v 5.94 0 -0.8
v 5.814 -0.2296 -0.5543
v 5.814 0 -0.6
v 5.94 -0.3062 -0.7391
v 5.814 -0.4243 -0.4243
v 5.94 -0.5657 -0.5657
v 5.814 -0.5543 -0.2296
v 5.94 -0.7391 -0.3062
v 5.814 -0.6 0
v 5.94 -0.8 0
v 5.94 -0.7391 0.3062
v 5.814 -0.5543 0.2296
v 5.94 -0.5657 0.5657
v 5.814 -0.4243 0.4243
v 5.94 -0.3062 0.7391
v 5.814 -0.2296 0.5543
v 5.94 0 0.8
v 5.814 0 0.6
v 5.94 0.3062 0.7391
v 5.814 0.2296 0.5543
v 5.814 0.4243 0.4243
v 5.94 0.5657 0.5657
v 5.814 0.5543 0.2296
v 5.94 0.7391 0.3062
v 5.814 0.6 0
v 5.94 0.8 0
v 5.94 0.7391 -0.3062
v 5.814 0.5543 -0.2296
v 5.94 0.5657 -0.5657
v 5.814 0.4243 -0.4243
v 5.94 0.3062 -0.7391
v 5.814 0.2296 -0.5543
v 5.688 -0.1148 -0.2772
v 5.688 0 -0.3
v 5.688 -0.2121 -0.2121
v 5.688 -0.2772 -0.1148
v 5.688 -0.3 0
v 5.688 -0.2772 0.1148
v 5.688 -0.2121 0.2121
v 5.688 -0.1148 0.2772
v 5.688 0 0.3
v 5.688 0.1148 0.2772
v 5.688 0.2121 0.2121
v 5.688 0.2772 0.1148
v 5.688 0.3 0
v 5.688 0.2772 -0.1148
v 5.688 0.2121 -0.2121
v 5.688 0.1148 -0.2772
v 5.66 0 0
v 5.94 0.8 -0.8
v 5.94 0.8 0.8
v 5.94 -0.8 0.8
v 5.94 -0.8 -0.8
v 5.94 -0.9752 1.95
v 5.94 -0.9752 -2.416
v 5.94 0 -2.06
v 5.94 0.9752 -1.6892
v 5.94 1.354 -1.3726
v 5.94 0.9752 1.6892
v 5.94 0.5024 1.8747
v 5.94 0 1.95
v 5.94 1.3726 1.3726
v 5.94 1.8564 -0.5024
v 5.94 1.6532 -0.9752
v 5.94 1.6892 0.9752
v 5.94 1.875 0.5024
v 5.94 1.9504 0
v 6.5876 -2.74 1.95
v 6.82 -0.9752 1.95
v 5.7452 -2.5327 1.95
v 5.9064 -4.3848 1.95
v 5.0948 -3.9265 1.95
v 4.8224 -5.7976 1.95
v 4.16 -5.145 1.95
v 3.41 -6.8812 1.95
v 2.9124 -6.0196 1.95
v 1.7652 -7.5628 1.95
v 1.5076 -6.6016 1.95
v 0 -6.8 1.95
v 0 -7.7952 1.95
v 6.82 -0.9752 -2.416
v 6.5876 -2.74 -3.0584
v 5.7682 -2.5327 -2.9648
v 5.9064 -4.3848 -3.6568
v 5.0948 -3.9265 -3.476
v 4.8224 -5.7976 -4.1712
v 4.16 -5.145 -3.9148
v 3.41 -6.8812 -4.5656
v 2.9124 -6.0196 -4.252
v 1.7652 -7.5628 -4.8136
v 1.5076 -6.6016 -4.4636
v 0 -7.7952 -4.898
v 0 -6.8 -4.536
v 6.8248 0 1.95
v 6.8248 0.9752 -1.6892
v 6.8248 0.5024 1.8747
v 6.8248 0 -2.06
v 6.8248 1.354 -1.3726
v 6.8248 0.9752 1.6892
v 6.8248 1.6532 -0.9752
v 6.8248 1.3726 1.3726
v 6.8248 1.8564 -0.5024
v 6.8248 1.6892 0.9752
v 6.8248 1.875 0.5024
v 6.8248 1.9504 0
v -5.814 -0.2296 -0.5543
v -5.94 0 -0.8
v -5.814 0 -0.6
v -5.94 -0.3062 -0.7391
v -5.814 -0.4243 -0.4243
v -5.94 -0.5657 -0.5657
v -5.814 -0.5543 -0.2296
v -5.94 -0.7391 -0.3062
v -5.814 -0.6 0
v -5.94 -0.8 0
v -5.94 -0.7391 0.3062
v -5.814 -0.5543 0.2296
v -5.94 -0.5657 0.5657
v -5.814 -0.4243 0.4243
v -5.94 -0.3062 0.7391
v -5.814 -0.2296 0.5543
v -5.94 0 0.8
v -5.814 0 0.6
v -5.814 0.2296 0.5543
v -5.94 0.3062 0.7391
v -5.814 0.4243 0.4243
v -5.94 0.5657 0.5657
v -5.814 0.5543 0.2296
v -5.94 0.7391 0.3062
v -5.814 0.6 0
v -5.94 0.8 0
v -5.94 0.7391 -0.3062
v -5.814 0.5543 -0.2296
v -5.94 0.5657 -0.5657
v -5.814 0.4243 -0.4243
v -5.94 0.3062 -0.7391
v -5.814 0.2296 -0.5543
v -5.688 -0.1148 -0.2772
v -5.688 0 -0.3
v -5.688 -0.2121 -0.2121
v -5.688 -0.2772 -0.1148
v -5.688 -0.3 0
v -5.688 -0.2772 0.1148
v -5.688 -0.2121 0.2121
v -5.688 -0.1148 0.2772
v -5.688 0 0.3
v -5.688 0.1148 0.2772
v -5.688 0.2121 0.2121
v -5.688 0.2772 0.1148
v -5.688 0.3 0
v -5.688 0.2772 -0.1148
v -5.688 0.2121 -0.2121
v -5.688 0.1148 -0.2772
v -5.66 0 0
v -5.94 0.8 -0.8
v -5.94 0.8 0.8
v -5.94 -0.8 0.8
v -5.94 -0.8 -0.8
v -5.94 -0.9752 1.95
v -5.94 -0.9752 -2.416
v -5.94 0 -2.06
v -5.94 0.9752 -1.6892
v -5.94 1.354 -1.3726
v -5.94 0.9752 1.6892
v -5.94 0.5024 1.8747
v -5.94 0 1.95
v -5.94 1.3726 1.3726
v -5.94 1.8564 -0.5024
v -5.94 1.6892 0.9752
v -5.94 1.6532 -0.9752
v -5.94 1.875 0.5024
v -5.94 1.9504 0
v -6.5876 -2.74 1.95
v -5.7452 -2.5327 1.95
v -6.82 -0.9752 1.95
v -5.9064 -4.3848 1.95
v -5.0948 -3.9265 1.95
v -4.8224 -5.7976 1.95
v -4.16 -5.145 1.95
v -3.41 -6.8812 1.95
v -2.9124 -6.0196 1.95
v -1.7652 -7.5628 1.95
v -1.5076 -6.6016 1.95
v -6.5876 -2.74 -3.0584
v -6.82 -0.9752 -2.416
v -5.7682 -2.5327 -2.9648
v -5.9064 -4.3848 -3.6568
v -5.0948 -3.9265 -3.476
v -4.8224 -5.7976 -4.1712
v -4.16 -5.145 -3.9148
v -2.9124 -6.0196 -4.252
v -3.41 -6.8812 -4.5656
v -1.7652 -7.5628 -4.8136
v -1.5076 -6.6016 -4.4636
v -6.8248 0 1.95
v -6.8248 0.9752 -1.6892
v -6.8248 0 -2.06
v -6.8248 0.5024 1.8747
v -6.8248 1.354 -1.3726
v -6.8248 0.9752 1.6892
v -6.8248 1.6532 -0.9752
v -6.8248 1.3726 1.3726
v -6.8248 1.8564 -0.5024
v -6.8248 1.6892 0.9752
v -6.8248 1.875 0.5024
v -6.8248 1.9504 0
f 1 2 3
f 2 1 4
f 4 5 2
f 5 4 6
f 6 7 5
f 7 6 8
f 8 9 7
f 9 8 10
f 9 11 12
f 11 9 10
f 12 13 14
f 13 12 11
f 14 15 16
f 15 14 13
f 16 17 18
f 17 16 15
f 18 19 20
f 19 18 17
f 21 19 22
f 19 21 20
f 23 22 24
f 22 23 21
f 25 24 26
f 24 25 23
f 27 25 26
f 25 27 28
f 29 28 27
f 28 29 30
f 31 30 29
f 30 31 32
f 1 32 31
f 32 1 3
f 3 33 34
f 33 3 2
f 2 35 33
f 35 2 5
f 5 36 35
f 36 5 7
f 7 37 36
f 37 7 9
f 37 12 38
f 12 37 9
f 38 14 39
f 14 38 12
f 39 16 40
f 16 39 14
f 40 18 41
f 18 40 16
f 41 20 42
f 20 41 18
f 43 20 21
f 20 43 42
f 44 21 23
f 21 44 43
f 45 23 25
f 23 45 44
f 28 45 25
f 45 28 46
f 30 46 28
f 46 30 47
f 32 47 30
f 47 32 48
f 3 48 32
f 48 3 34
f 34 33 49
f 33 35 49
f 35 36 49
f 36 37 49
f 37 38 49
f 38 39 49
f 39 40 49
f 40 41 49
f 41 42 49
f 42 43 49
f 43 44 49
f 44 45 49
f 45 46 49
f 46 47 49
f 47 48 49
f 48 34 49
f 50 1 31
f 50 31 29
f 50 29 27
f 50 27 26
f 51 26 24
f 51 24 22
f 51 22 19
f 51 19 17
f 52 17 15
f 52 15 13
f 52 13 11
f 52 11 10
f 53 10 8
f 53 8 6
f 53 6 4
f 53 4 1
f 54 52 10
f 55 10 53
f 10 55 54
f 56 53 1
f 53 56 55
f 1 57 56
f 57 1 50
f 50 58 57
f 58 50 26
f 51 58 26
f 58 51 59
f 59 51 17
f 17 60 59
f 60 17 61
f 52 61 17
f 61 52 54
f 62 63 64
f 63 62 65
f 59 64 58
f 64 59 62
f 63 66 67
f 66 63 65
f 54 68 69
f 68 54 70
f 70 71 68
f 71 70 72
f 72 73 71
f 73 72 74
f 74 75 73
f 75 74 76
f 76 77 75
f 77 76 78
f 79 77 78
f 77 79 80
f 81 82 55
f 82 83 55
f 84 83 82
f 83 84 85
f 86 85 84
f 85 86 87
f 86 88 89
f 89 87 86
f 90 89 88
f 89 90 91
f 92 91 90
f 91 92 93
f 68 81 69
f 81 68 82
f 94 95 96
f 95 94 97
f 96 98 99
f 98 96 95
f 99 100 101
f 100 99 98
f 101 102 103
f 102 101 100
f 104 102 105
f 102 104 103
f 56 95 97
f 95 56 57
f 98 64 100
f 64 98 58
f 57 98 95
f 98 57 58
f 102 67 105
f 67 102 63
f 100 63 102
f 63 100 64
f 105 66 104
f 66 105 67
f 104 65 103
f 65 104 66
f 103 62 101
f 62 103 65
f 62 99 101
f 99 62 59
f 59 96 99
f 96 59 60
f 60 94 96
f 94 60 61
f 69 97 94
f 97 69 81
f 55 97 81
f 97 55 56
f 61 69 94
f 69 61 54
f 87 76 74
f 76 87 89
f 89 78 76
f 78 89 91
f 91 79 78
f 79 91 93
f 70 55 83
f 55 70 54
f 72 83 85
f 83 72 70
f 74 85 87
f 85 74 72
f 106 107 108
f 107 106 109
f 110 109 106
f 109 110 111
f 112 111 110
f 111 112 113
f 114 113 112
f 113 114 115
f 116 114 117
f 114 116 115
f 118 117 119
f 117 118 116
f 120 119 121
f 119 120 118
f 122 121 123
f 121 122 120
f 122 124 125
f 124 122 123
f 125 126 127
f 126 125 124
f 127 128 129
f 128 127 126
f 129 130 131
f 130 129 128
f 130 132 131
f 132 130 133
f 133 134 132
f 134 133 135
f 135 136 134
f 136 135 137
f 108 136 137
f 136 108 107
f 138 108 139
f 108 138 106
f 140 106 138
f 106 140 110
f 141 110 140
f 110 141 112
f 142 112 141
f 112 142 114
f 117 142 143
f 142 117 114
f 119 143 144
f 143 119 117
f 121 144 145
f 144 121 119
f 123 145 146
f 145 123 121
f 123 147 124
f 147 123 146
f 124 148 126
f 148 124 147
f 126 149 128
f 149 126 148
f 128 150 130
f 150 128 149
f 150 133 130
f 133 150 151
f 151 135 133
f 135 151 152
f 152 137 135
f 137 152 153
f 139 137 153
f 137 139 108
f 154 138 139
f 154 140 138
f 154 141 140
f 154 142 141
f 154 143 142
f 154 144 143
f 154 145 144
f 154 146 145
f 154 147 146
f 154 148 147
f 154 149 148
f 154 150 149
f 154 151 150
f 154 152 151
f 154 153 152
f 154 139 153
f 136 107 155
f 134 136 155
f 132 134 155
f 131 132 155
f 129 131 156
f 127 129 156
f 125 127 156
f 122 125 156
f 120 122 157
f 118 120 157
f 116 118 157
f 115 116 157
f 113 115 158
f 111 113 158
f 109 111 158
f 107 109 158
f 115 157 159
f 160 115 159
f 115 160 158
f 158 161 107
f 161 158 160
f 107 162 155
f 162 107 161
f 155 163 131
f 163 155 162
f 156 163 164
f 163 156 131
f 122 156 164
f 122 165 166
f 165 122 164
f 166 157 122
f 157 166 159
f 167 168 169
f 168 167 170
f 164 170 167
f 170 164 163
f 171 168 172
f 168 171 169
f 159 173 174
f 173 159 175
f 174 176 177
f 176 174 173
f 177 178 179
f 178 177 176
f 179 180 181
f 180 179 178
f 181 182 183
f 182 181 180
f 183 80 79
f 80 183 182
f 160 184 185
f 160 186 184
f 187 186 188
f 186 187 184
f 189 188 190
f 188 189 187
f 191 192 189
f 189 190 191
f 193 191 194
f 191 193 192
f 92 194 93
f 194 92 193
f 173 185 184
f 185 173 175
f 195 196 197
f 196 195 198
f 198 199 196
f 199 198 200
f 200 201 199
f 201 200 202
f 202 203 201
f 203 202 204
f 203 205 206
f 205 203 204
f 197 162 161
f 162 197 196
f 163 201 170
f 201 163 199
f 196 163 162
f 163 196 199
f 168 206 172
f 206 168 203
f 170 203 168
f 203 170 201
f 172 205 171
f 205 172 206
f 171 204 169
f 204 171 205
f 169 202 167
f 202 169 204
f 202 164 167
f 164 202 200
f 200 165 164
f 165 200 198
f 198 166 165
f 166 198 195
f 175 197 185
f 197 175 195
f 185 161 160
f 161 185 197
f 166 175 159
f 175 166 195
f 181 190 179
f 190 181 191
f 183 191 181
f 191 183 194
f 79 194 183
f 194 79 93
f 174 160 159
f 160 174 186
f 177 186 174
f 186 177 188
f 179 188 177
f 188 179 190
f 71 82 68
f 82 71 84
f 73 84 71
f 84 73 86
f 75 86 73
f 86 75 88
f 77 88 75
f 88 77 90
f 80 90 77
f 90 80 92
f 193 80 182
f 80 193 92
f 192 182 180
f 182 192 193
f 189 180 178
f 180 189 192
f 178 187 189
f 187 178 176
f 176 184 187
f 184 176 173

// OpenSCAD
// file: ../p/4-4edge.scad
use <../lib.scad>
function ldraw_lib__4_4edge() = [
// 0 Circle 1.0
// 0 Name: 4-4edge.dat
// 0 Author: James Jessiman
// 0 !LDRAW_ORG Primitive UPDATE 2017-01
// 0 !LICENSE Licensed under CC BY 2.0 and CC BY 4.0 : see CAreadme.txt
// 
// 0 BFC CERTIFY CCW
  [0,"BFC","CERTIFY"],
  [0,"BFC","CCW"],
// 
// 0 !HISTORY 1998-12-15 [PTadmin] Official Update 1998-10
// 0 !HISTORY 2005-12-28 [PTadmin] Official Update 2005-01
// 0 !HISTORY 2007-06-24 [PTadmin] Header formatted for Contributor Agreement
// 0 !HISTORY 2008-07-01 [PTadmin] Official Update 2008-01
// 0 !HISTORY 2017-01-15 [Steffen] BFCed
// 0 !HISTORY 2017-12-30 [PTadmin] Official Update 2017-01
// 
// 
// 2 24 1 0 0 0.9239 0 0.3827
  [2,24,1,0,0,0.9239,0,0.3827],
// 2 24 0.9239 0 0.3827 0.7071 0 0.7071
  [2,24,0.9239,0,0.3827,0.7071,0,0.7071],
// 2 24 0.7071 0 0.7071 0.3827 0 0.9239
  [2,24,0.7071,0,0.7071,0.3827,0,0.9239],
// 2 24 0.3827 0 0.9239 0 0 1
  [2,24,0.3827,0,0.9239,0,0,1],
// 2 24 0 0 1 -0.3827 0 0.9239
  [2,24,0,0,1,-0.3827,0,0.9239],
// 2 24 -0.3827 0 0.9239 -0.7071 0 0.7071
  [2,24,-0.3827,0,0.9239,-0.7071,0,0.7071],
// 2 24 -0.7071 0 0.7071 -0.9239 0 0.3827
  [2,24,-0.7071,0,0.7071,-0.9239,0,0.3827],
// 2 24 -0.9239 0 0.3827 -1 0 -0
  [2,24,-0.9239,0,0.3827,-1,0,-0],
// 2 24 -1 0 -0 -0.9239 0 -0.3827
  [2,24,-1,0,-0,-0.9239,0,-0.3827],
// 2 24 -0.9239 0 -0.3827 -0.7071 0 -0.7071
  [2,24,-0.9239,0,-0.3827,-0.7071,0,-0.7071],
// 2 24 -0.7071 0 -0.7071 -0.3827 0 -0.9239
  [2,24,-0.7071,0,-0.7071,-0.3827,0,-0.9239],
// 2 24 -0.3827 0 -0.9239 0 0 -1
  [2,24,-0.3827,0,-0.9239,0,0,-1],
// 2 24 0 0 -1 0.3827 0 -0.9239
  [2,24,0,0,-1,0.3827,0,-0.9239],
// 2 24 0.3827 0 -0.9239 0.7071 0 -0.7071
  [2,24,0.3827,0,-0.9239,0.7071,0,-0.7071],
// 2 24 0.7071 0 -0.7071 0.9239 0 -0.3827
  [2,24,0.7071,0,-0.7071,0.9239,0,-0.3827],
// 2 24 0.9239 0 -0.3827 1 0 0
  [2,24,0.9239,0,-0.3827,1,0,0],
];
module ldraw_lib__4_4edge(step=0, col=false, unit=2/5, alt=false, line=0.2, solid=!$preview)
    makepoly(ldraw_lib__4_4edge(), step=step, col=col, unit=unit, alt=alt, line=line, solid=solid);
ldraw_lib__4_4edge(line=0.2);
// file: ../p/4-4con3.scad
use <../lib.scad>
function ldraw_lib__4_4con3() = [
// 0 Cone  3 x 1.0
// 0 Name: 4-4con3.dat
// 0 Author: Niels Karsdorp [nielsk]
// 0 !LDRAW_ORG Primitive UPDATE 2003-02
// 0 !LICENSE Licensed under CC BY 4.0 : see CAreadme.txt
// 
// 0 BFC CERTIFY CCW
  [0,"BFC","CERTIFY"],
  [0,"BFC","CCW"],
// 
// 0 !HISTORY 2003-08-01 [PTadmin] Official Update 2003-02
// 0 !HISTORY 2007-06-24 [PTadmin] Header formatted for Contributor Agreement
// 0 !HISTORY 2008-07-01 [PTadmin] Official Update 2008-01
// 
// 
// 5 24 3 1 0 4 0 0 2.7717 1 1.1481 2.7717 1 -1.1481
  [5,24,3,1,0,4,0,0,2.7717,1,1.1481,2.7717,1,-1.1481],
// 5 24 2.7717 1 1.1481 3.6956 0 1.5308 2.1213 1 2.1213 3 1 0
  [5,24,2.7717,1,1.1481,3.6956,0,1.5308,2.1213,1,2.1213,3,1,0],
// 5 24 2.1213 1 2.1213 2.8284 0 2.8284 1.1481 1 2.7717 2.7717 1 1.1481
  [5,24,2.1213,1,2.1213,2.8284,0,2.8284,1.1481,1,2.7717,2.7717,1,1.1481],
// 5 24 1.1481 1 2.7717 1.5308 0 3.6956 0 1 3 2.1213 1 2.1213
  [5,24,1.1481,1,2.7717,1.5308,0,3.6956,0,1,3,2.1213,1,2.1213],
// 5 24 0 1 3 0 0 4 -1.1481 1 2.7717 1.1481 1 2.7717
  [5,24,0,1,3,0,0,4,-1.1481,1,2.7717,1.1481,1,2.7717],
// 5 24 -1.1481 1 2.7717 -1.5308 0 3.6956 -2.1213 1 2.1213 0 1 3
  [5,24,-1.1481,1,2.7717,-1.5308,0,3.6956,-2.1213,1,2.1213,0,1,3],
// 5 24 -2.1213 1 2.1213 -2.8284 0 2.8284 -2.7717 1 1.1481 -1.1481 1 2.7717
  [5,24,-2.1213,1,2.1213,-2.8284,0,2.8284,-2.7717,1,1.1481,-1.1481,1,2.7717],
// 5 24 -2.7717 1 1.1481 -3.6956 0 1.5308 -3 1 0 -2.1213 1 2.1213
  [5,24,-2.7717,1,1.1481,-3.6956,0,1.5308,-3,1,0,-2.1213,1,2.1213],
// 5 24 -3 1 0 -4 0 0 -2.7717 1 -1.1481 -2.7717 1 1.1481
  [5,24,-3,1,0,-4,0,0,-2.7717,1,-1.1481,-2.7717,1,1.1481],
// 5 24 -2.7717 1 -1.1481 -3.6956 0 -1.5308 -2.1213 1 -2.1213 -3 1 0
  [5,24,-2.7717,1,-1.1481,-3.6956,0,-1.5308,-2.1213,1,-2.1213,-3,1,0],
// 5 24 -2.1213 1 -2.1213 -2.8284 0 -2.8284 -1.1481 1 -2.7717 -2.7717 1 -1.1481
  [5,24,-2.1213,1,-2.1213,-2.8284,0,-2.8284,-1.1481,1,-2.7717,-2.7717,1,-1.1481],
// 5 24 -1.1481 1 -2.7717 -1.5308 0 -3.6956 0 1 -3 -2.1213 1 -2.1213
  [5,24,-1.1481,1,-2.7717,-1.5308,0,-3.6956,0,1,-3,-2.1213,1,-2.1213],
// 5 24 0 1 -3 0 0 -4 1.1481 1 -2.7717 -1.1481 1 -2.7717
  [5,24,0,1,-3,0,0,-4,1.1481,1,-2.7717,-1.1481,1,-2.7717],
// 5 24 1.1481 1 -2.7717 1.5308 0 -3.6956 2.1213 1 -2.1213 0 1 -3
  [5,24,1.1481,1,-2.7717,1.5308,0,-3.6956,2.1213,1,-2.1213,0,1,-3],
// 5 24 2.1213 1 -2.1213 2.8284 0 -2.8284 2.7717 1 -1.1481 1.1481 1 -2.7717
  [5,24,2.1213,1,-2.1213,2.8284,0,-2.8284,2.7717,1,-1.1481,1.1481,1,-2.7717],
// 5 24 2.7717 1 -1.1481 3.6956 0 -1.5308 3 1 0 2.1213 1 -2.1213
  [5,24,2.7717,1,-1.1481,3.6956,0,-1.5308,3,1,0,2.1213,1,-2.1213],
// 
// 4 16 3 1 0 2.7717 1 1.1481 3.6956 0 1.5308 4 0 0
  [4,16,3,1,0,2.7717,1,1.1481,3.6956,0,1.5308,4,0,0],
// 4 16 2.7717 1 1.1481 2.1213 1 2.1213 2.8284 0 2.8284 3.6956 0 1.5308
  [4,16,2.7717,1,1.1481,2.1213,1,2.1213,2.8284,0,2.8284,3.6956,0,1.5308],
// 4 16 2.1213 1 2.1213 1.1481 1 2.7717 1.5308 0 3.6956 2.8284 0 2.8284
  [4,16,2.1213,1,2.1213,1.1481,1,2.7717,1.5308,0,3.6956,2.8284,0,2.8284],
// 4 16 1.1481 1 2.7717 0 1 3 0 0 4 1.5308 0 3.6956
  [4,16,1.1481,1,2.7717,0,1,3,0,0,4,1.5308,0,3.6956],
// 4 16 0 1 3 -1.1481 1 2.7717 -1.5308 0 3.6956 0 0 4
  [4,16,0,1,3,-1.1481,1,2.7717,-1.5308,0,3.6956,0,0,4],
// 4 16 -1.1481 1 2.7717 -2.1213 1 2.1213 -2.8284 0 2.8284 -1.5308 0 3.6956
  [4,16,-1.1481,1,2.7717,-2.1213,1,2.1213,-2.8284,0,2.8284,-1.5308,0,3.6956],
// 4 16 -2.1213 1 2.1213 -2.7717 1 1.1481 -3.6956 0 1.5308 -2.8284 0 2.8284
  [4,16,-2.1213,1,2.1213,-2.7717,1,1.1481,-3.6956,0,1.5308,-2.8284,0,2.8284],
// 4 16 -2.7717 1 1.1481 -3 1 0 -4 0 0 -3.6956 0 1.5308
  [4,16,-2.7717,1,1.1481,-3,1,0,-4,0,0,-3.6956,0,1.5308],
// 4 16 -3 1 0 -2.7717 1 -1.1481 -3.6956 0 -1.5308 -4 0 0
  [4,16,-3,1,0,-2.7717,1,-1.1481,-3.6956,0,-1.5308,-4,0,0],
// 4 16 -2.7717 1 -1.1481 -2.1213 1 -2.1213 -2.8284 0 -2.8284 -3.6956 0 -1.5308
  [4,16,-2.7717,1,-1.1481,-2.1213,1,-2.1213,-2.8284,0,-2.8284,-3.6956,0,-1.5308],
// 4 16 -2.1213 1 -2.1213 -1.1481 1 -2.7717 -1.5308 0 -3.6956 -2.8284 0 -2.8284
  [4,16,-2.1213,1,-2.1213,-1.1481,1,-2.7717,-1.5308,0,-3.6956,-2.8284,0,-2.8284],
// 4 16 -1.1481 1 -2.7717 0 1 -3 0 0 -4 -1.5308 0 -3.6956
  [4,16,-1.1481,1,-2.7717,0,1,-3,0,0,-4,-1.5308,0,-3.6956],
// 4 16 0 1 -3 1.1481 1 -2.7717 1.5308 0 -3.6956 0 0 -4
  [4,16,0,1,-3,1.1481,1,-2.7717,1.5308,0,-3.6956,0,0,-4],
// 4 16 1.1481 1 -2.7717 2.1213 1 -2.1213 2.8284 0 -2.8284 1.5308 0 -3.6956
  [4,16,1.1481,1,-2.7717,2.1213,1,-2.1213,2.8284,0,-2.8284,1.5308,0,-3.6956],
// 4 16 2.1213 1 -2.1213 2.7717 1 -1.1481 3.6956 0 -1.5308 2.8284 0 -2.8284
  [4,16,2.1213,1,-2.1213,2.7717,1,-1.1481,3.6956,0,-1.5308,2.8284,0,-2.8284],
// 4 16 2.7717 1 -1.1481 3 1 0 4 0 0 3.6956 0 -1.5308
  [4,16,2.7717,1,-1.1481,3,1,0,4,0,0,3.6956,0,-1.5308],
// 
// 0
// 
];
module ldraw_lib__4_4con3(step=0, col=false, unit=2/5, alt=false, line=0.2, solid=!$preview)
    makepoly(ldraw_lib__4_4con3(), step=step, col=col, unit=unit, alt=alt, line=line, solid=solid);
ldraw_lib__4_4con3(line=0.2);
// file: ../p/4-4con1.scad
use <../lib.scad>
function ldraw_lib__4_4con1() = [
// 0 Cone  1 x 1.0
// 0 Name: 4-4con1.dat
// 0 Author: Steve Bliss [sbliss]
// 0 !LDRAW_ORG Primitive UPDATE 2012-01
// 0 !LICENSE Licensed under CC BY 4.0 : see CAreadme.txt
// 
// 0 BFC CERTIFY CCW
  [0,"BFC","CERTIFY"],
  [0,"BFC","CCW"],
// 
// 0 !HISTORY 1999-08-19 [sbliss] Renamed 4-4con12.dat to 4-4con1.dat, Moved all conditional lines before quads
// 0 !HISTORY 2000-05-07 [PTadmin] Official Update 2000-01
// 0 !HISTORY 2002-12-11 [cwdee] Standardised title and made BFC compliant
// 0 !HISTORY 2003-08-01 [PTadmin] Official Update 2003-02
// 0 !HISTORY 2007-06-24 [PTadmin] Header formatted for Contributor Agreement
// 0 !HISTORY 2008-07-01 [PTadmin] Official Update 2008-01
// 0 !HISTORY 2012-02-16 [Philo] Changed to CCW, reordered
// 0 !HISTORY 2012-03-30 [PTadmin] Official Update 2012-01
// 
// 
// 5 24 1 1 0 2 0 0 0.9239 1 -0.3827 0.9239 1 0.3827
  [5,24,1,1,0,2,0,0,0.9239,1,-0.3827,0.9239,1,0.3827],
// 5 24 0.9239 1 0.3827 1.8478 0 0.7654 1 1 0 0.7071 1 0.7071
  [5,24,0.9239,1,0.3827,1.8478,0,0.7654,1,1,0,0.7071,1,0.7071],
// 5 24 0.7071 1 0.7071 1.4142 0 1.4142 0.9239 1 0.3827 0.3827 1 0.9239
  [5,24,0.7071,1,0.7071,1.4142,0,1.4142,0.9239,1,0.3827,0.3827,1,0.9239],
// 5 24 0.3827 1 0.9239 0.7654 0 1.8478 0.7071 1 0.7071 0 1 1
  [5,24,0.3827,1,0.9239,0.7654,0,1.8478,0.7071,1,0.7071,0,1,1],
// 5 24 0 1 1 0 0 2 0.3827 1 0.9239 -0.3827 1 0.9239
  [5,24,0,1,1,0,0,2,0.3827,1,0.9239,-0.3827,1,0.9239],
// 5 24 -0.3827 1 0.9239 -0.7654 0 1.8478 0 1 1 -0.7071 1 0.7071
  [5,24,-0.3827,1,0.9239,-0.7654,0,1.8478,0,1,1,-0.7071,1,0.7071],
// 5 24 -0.7071 1 0.7071 -1.4142 0 1.4142 -0.3827 1 0.9239 -0.9239 1 0.3827
  [5,24,-0.7071,1,0.7071,-1.4142,0,1.4142,-0.3827,1,0.9239,-0.9239,1,0.3827],
// 5 24 -0.9239 1 0.3827 -1.8478 0 0.7654 -0.7071 1 0.7071 -1 1 0
  [5,24,-0.9239,1,0.3827,-1.8478,0,0.7654,-0.7071,1,0.7071,-1,1,0],
// 5 24 -1 1 0 -2 0 0 -0.9239 1 0.3827 -0.9239 1 -0.3827
  [5,24,-1,1,0,-2,0,0,-0.9239,1,0.3827,-0.9239,1,-0.3827],
// 5 24 -0.9239 1 -0.3827 -1.8478 0 -0.7654 -1 1 0 -0.7071 1 -0.7071
  [5,24,-0.9239,1,-0.3827,-1.8478,0,-0.7654,-1,1,0,-0.7071,1,-0.7071],
// 5 24 -0.7071 1 -0.7071 -1.4142 0 -1.4142 -0.9239 1 -0.3827 -0.3827 1 -0.9239
  [5,24,-0.7071,1,-0.7071,-1.4142,0,-1.4142,-0.9239,1,-0.3827,-0.3827,1,-0.9239],
// 5 24 -0.3827 1 -0.9239 -0.7654 0 -1.8478 -0.7071 1 -0.7071 0 1 -1
  [5,24,-0.3827,1,-0.9239,-0.7654,0,-1.8478,-0.7071,1,-0.7071,0,1,-1],
// 5 24 0 1 -1 0 0 -2 -0.3827 1 -0.9239 0.3827 1 -0.9239
  [5,24,0,1,-1,0,0,-2,-0.3827,1,-0.9239,0.3827,1,-0.9239],
// 5 24 0.3827 1 -0.9239 0.7654 0 -1.8478 0 1 -1 0.7071 1 -0.7071
  [5,24,0.3827,1,-0.9239,0.7654,0,-1.8478,0,1,-1,0.7071,1,-0.7071],
// 5 24 0.7071 1 -0.7071 1.4142 0 -1.4142 0.3827 1 -0.9239 0.9239 1 -0.3827
  [5,24,0.7071,1,-0.7071,1.4142,0,-1.4142,0.3827,1,-0.9239,0.9239,1,-0.3827],
// 5 24 0.9239 1 -0.3827 1.8478 0 -0.7654 0.7071 1 -0.7071 1 1 0
  [5,24,0.9239,1,-0.3827,1.8478,0,-0.7654,0.7071,1,-0.7071,1,1,0],
// 
// 4 16 2 0 0 1 1 0 0.9239 1 0.3827 1.8478 0 0.7654
  [4,16,2,0,0,1,1,0,0.9239,1,0.3827,1.8478,0,0.7654],
// 4 16 1.8478 0 0.7654 0.9239 1 0.3827 0.7071 1 0.7071 1.4142 0 1.4142
  [4,16,1.8478,0,0.7654,0.9239,1,0.3827,0.7071,1,0.7071,1.4142,0,1.4142],
// 4 16 1.4142 0 1.4142 0.7071 1 0.7071 0.3827 1 0.9239 0.7654 0 1.8478
  [4,16,1.4142,0,1.4142,0.7071,1,0.7071,0.3827,1,0.9239,0.7654,0,1.8478],
// 4 16 0.7654 0 1.8478 0.3827 1 0.9239 0 1 1 0 0 2
  [4,16,0.7654,0,1.8478,0.3827,1,0.9239,0,1,1,0,0,2],
// 4 16 0 0 2 0 1 1 -0.3827 1 0.9239 -0.7654 0 1.8478
  [4,16,0,0,2,0,1,1,-0.3827,1,0.9239,-0.7654,0,1.8478],
// 4 16 -0.7654 0 1.8478 -0.3827 1 0.9239 -0.7071 1 0.7071 -1.4142 0 1.4142
  [4,16,-0.7654,0,1.8478,-0.3827,1,0.9239,-0.7071,1,0.7071,-1.4142,0,1.4142],
// 4 16 -1.4142 0 1.4142 -0.7071 1 0.7071 -0.9239 1 0.3827 -1.8478 0 0.7654
  [4,16,-1.4142,0,1.4142,-0.7071,1,0.7071,-0.9239,1,0.3827,-1.8478,0,0.7654],
// 4 16 -1.8478 0 0.7654 -0.9239 1 0.3827 -1 1 0 -2 0 0
  [4,16,-1.8478,0,0.7654,-0.9239,1,0.3827,-1,1,0,-2,0,0],
// 4 16 -2 0 0 -1 1 0 -0.9239 1 -0.3827 -1.8478 0 -0.7654
  [4,16,-2,0,0,-1,1,0,-0.9239,1,-0.3827,-1.8478,0,-0.7654],
// 4 16 -1.8478 0 -0.7654 -0.9239 1 -0.3827 -0.7071 1 -0.7071 -1.4142 0 -1.4142
  [4,16,-1.8478,0,-0.7654,-0.9239,1,-0.3827,-0.7071,1,-0.7071,-1.4142,0,-1.4142],
// 4 16 -1.4142 0 -1.4142 -0.7071 1 -0.7071 -0.3827 1 -0.9239 -0.7654 0 -1.8478
  [4,16,-1.4142,0,-1.4142,-0.7071,1,-0.7071,-0.3827,1,-0.9239,-0.7654,0,-1.8478],
// 4 16 -0.7654 0 -1.8478 -0.3827 1 -0.9239 0 1 -1 0 0 -2
  [4,16,-0.7654,0,-1.8478,-0.3827,1,-0.9239,0,1,-1,0,0,-2],
// 4 16 0 0 -2 0 1 -1 0.3827 1 -0.9239 0.7654 0 -1.8478
  [4,16,0,0,-2,0,1,-1,0.3827,1,-0.9239,0.7654,0,-1.8478],
// 4 16 0.7654 0 -1.8478 0.3827 1 -0.9239 0.7071 1 -0.7071 1.4142 0 -1.4142
  [4,16,0.7654,0,-1.8478,0.3827,1,-0.9239,0.7071,1,-0.7071,1.4142,0,-1.4142],
// 4 16 1.4142 0 -1.4142 0.7071 1 -0.7071 0.9239 1 -0.3827 1.8478 0 -0.7654
  [4,16,1.4142,0,-1.4142,0.7071,1,-0.7071,0.9239,1,-0.3827,1.8478,0,-0.7654],
// 4 16 1.8478 0 -0.7654 0.9239 1 -0.3827 1 1 0 2 0 0
  [4,16,1.8478,0,-0.7654,0.9239,1,-0.3827,1,1,0,2,0,0],
];
module ldraw_lib__4_4con1(step=0, col=false, unit=2/5, alt=false, line=0.2, solid=!$preview)
    makepoly(ldraw_lib__4_4con1(), step=step, col=col, unit=unit, alt=alt, line=line, solid=solid);
ldraw_lib__4_4con1(line=0.2);
// file: ../p/4-4con0.scad
use <../lib.scad>
function ldraw_lib__4_4con0() = [
// 0 Cone  0 x 1.0
// 0 Name: 4-4con0.dat
// 0 Author: William Howard [WilliamH]
// 0 !LDRAW_ORG Primitive UPDATE 2009-03
// 0 !LICENSE Licensed under CC BY 2.0 and CC BY 4.0 : see CAreadme.txt
// 
// 0 BFC CERTIFY CCW
  [0,"BFC","CERTIFY"],
  [0,"BFC","CCW"],
// 
// 0 !HISTORY 2009-12-29 [PTadmin] Official Update 2009-03
// 
// 
// 3 16 0 1 0 0.9239 0 0.3827 1 0 0
  [3,16,0,1,0,0.9239,0,0.3827,1,0,0],
// 3 16 0 1 0 0.7071 0 0.7071 0.9239 0 0.3827
  [3,16,0,1,0,0.7071,0,0.7071,0.9239,0,0.3827],
// 3 16 0 1 0 0.3827 0 0.9239 0.7071 0 0.7071
  [3,16,0,1,0,0.3827,0,0.9239,0.7071,0,0.7071],
// 3 16 0 1 0 0 0 1 0.3827 0 0.9239
  [3,16,0,1,0,0,0,1,0.3827,0,0.9239],
// 3 16 0 1 0 -0.3827 0 0.9239 0 0 1
  [3,16,0,1,0,-0.3827,0,0.9239,0,0,1],
// 3 16 0 1 0 -0.7071 0 0.7071 -0.3827 0 0.9239
  [3,16,0,1,0,-0.7071,0,0.7071,-0.3827,0,0.9239],
// 3 16 0 1 0 -0.9239 0 0.3827 -0.7071 0 0.7071
  [3,16,0,1,0,-0.9239,0,0.3827,-0.7071,0,0.7071],
// 3 16 0 1 0 -1 0 0 -0.9239 0 0.3827
  [3,16,0,1,0,-1,0,0,-0.9239,0,0.3827],
// 3 16 0 1 0 -0.9239 0 -0.3827 -1 0 0
  [3,16,0,1,0,-0.9239,0,-0.3827,-1,0,0],
// 3 16 0 1 0 -0.7071 0 -0.7071 -0.9239 0 -0.3827
  [3,16,0,1,0,-0.7071,0,-0.7071,-0.9239,0,-0.3827],
// 3 16 0 1 0 -0.3827 0 -0.9239 -0.7071 0 -0.7071
  [3,16,0,1,0,-0.3827,0,-0.9239,-0.7071,0,-0.7071],
// 3 16 0 1 0 0 0 -1 -0.3827 0 -0.9239
  [3,16,0,1,0,0,0,-1,-0.3827,0,-0.9239],
// 3 16 0 1 0 0.3827 0 -0.9239 0 0 -1
  [3,16,0,1,0,0.3827,0,-0.9239,0,0,-1],
// 3 16 0 1 0 0.7071 0 -0.7071 0.3827 0 -0.9239
  [3,16,0,1,0,0.7071,0,-0.7071,0.3827,0,-0.9239],
// 3 16 0 1 0 0.9239 0 -0.3827 0.7071 0 -0.7071
  [3,16,0,1,0,0.9239,0,-0.3827,0.7071,0,-0.7071],
// 3 16 0 1 0 1 0 0 0.9239 0 -0.3827
  [3,16,0,1,0,1,0,0,0.9239,0,-0.3827],
// 
// 0 conditional lines
// 5 24 0 1 0 1 0 0 0.9239 0 -0.3827 0.9239 0 0.3827
  [5,24,0,1,0,1,0,0,0.9239,0,-0.3827,0.9239,0,0.3827],
// 5 24 0 1 0 0.9239 0 0.3827 1 0 0 0.7071 0 0.7071
  [5,24,0,1,0,0.9239,0,0.3827,1,0,0,0.7071,0,0.7071],
// 5 24 0 1 0 0.7071 0 0.7071 0.9239 0 0.3827 0.3827 0 0.9239
  [5,24,0,1,0,0.7071,0,0.7071,0.9239,0,0.3827,0.3827,0,0.9239],
// 5 24 0 1 0 0.3827 0 0.9239 0.7071 0 0.7071 0 0 1
  [5,24,0,1,0,0.3827,0,0.9239,0.7071,0,0.7071,0,0,1],
// 5 24 0 1 0 0 0 1 0.3827 0 0.9239 -0.3827 0 0.9239
  [5,24,0,1,0,0,0,1,0.3827,0,0.9239,-0.3827,0,0.9239],
// 5 24 0 1 0 -0.3827 0 0.9239 0 0 1 -0.7071 0 0.7071
  [5,24,0,1,0,-0.3827,0,0.9239,0,0,1,-0.7071,0,0.7071],
// 5 24 0 1 0 -0.7071 0 0.7071 -0.3827 0 0.9239 -0.9239 0 0.3827
  [5,24,0,1,0,-0.7071,0,0.7071,-0.3827,0,0.9239,-0.9239,0,0.3827],
// 5 24 0 1 0 -0.9239 0 0.3827 -0.7071 0 0.7071 -1 0 0
  [5,24,0,1,0,-0.9239,0,0.3827,-0.7071,0,0.7071,-1,0,0],
// 5 24 0 1 0 -1 0 0 -0.9239 0 0.3827 -0.9239 0 -0.3827
  [5,24,0,1,0,-1,0,0,-0.9239,0,0.3827,-0.9239,0,-0.3827],
// 5 24 0 1 0 -0.9239 0 -0.3827 -1 0 0 -0.7071 0 -0.7071
  [5,24,0,1,0,-0.9239,0,-0.3827,-1,0,0,-0.7071,0,-0.7071],
// 5 24 0 1 0 -0.7071 0 -0.7071 -0.9239 0 -0.3827 -0.3827 0 -0.9239
  [5,24,0,1,0,-0.7071,0,-0.7071,-0.9239,0,-0.3827,-0.3827,0,-0.9239],
// 5 24 0 1 0 -0.3827 0 -0.9239 -0.7071 0 -0.7071 0 0 -1
  [5,24,0,1,0,-0.3827,0,-0.9239,-0.7071,0,-0.7071,0,0,-1],
// 5 24 0 1 0 0 0 -1 -0.3827 0 -0.9239 0.3827 0 -0.9239
  [5,24,0,1,0,0,0,-1,-0.3827,0,-0.9239,0.3827,0,-0.9239],
// 5 24 0 1 0 0.3827 0 -0.9239 0 0 -1 0.7071 0 -0.7071
  [5,24,0,1,0,0.3827,0,-0.9239,0,0,-1,0.7071,0,-0.7071],
// 5 24 0 1 0 0.7071 0 -0.7071 0.3827 0 -0.9239 0.9239 0 -0.3827
  [5,24,0,1,0,0.7071,0,-0.7071,0.3827,0,-0.9239,0.9239,0,-0.3827],
// 5 24 0 1 0 0.9239 0 -0.3827 0.7071 0 -0.7071 1 0 0
  [5,24,0,1,0,0.9239,0,-0.3827,0.7071,0,-0.7071,1,0,0],
// 
// 0 end of file
];
makepoly(ldraw_lib__4_4con0(), line=0.2);
// file: ../p/bump5000.scad
use <../lib.scad>
use <4-4con0.scad>
use <4-4con1.scad>
use <4-4con3.scad>
use <4-4edge.scad>
$fa=1; $fs=0.2;
function ldraw_lib__bump5000(realsolid=false) = [
// 0 Bump 1.0 x 0.5
// 0 Name: bump5000.dat
// 0 Author: Magnus Forsberg [MagFors]
// 0 !LDRAW_ORG Primitive UPDATE 2010-02
// 0 !LICENSE Licensed under CC BY 2.0 and CC BY 4.0 : see CAreadme.txt
// 
// 0 !HELP This file creates a bump with radius= 1 and height= 0.5 LDU
// 
// 0 BFC CERTIFY CCW
  [0,"BFC","CERTIFY"],
  [0,"BFC","CCW"],
// 
// 0 !HISTORY 2010-07-05 [PTadmin] Official Update 2010-02
// 
// 
// 1 16 0 0 0 0.25 0 0 0 -0.225 0 0 0 -0.25 4-4con3.dat
  [1,16,0,0,0,0.25,0,0,0,-0.225,0,0,0,-0.25, ldraw_lib__4_4con3(realsolid)],
// 1 16 0 -0.225 0 0.375 0 0 0 -0.225 0 0 0 -0.375 4-4con1.dat
  [1,16,0,-0.225,0,0.375,0,0,0,-0.225,0,0,0,-0.375, ldraw_lib__4_4con1(realsolid)],
// 1 16 0 -0.45 0 0.375 0 0 0 -0.05 0 0 0 -0.375 4-4con0.dat
  [1,16,0,-0.45,0,0.375,0,0,0,-0.05,0,0,0,-0.375, ldraw_lib__4_4con0(realsolid)],
// 1 16 0 0 0 1 0 0 0 1 0 0 0 1 4-4edge.dat
  [1,16,0,0,0,1,0,0,0,1,0,0,0,1, ldraw_lib__4_4edge(realsolid)],
// 5 24 0.692925 -0.225 -0.287025 0.75 -0.225 0 0.9239 0 -0.3827 0.375 -0.45 0
  [5,24,0.692925,-0.225,-0.287025,0.75,-0.225,0,0.9239,0,-0.3827,0.375,-0.45,0],
// 5 24 0.530325 -0.225 -0.530325 0.692925 -0.225 -0.287025 0.7071 0 -0.7071 0.3464625 -0.45 -0.1435125
  [5,24,0.530325,-0.225,-0.530325,0.692925,-0.225,-0.287025,0.7071,0,-0.7071,0.3464625,-0.45,-0.1435125],
// 5 24 0.287025 -0.225 -0.692925 0.530325 -0.225 -0.530325 0.3827 0 -0.9239 0.2651625 -0.45 -0.2651625
  [5,24,0.287025,-0.225,-0.692925,0.530325,-0.225,-0.530325,0.3827,0,-0.9239,0.2651625,-0.45,-0.2651625],
// 5 24 0 -0.225 -0.75 0.287025 -0.225 -0.692925 0 0 -1 0.1435125 -0.45 -0.3464625
  [5,24,0,-0.225,-0.75,0.287025,-0.225,-0.692925,0,0,-1,0.1435125,-0.45,-0.3464625],
// 5 24 -0.287025 -0.225 -0.692925 0 -0.225 -0.75 -0.3827 0 -0.9239 0 -0.45 -0.375
  [5,24,-0.287025,-0.225,-0.692925,0,-0.225,-0.75,-0.3827,0,-0.9239,0,-0.45,-0.375],
// 5 24 -0.530325 -0.225 -0.530325 -0.287025 -0.225 -0.692925 -0.7071 0 -0.7071 -0.1435125 -0.45 -0.3464625
  [5,24,-0.530325,-0.225,-0.530325,-0.287025,-0.225,-0.692925,-0.7071,0,-0.7071,-0.1435125,-0.45,-0.3464625],
// 5 24 -0.692925 -0.225 -0.287025 -0.530325 -0.225 -0.530325 -0.9239 0 -0.3827 -0.2651625 -0.45 -0.2651625
  [5,24,-0.692925,-0.225,-0.287025,-0.530325,-0.225,-0.530325,-0.9239,0,-0.3827,-0.2651625,-0.45,-0.2651625],
// 5 24 -0.75 -0.225 0 -0.692925 -0.225 -0.287025 -1 0 0 -0.3464625 -0.45 -0.1435125
  [5,24,-0.75,-0.225,0,-0.692925,-0.225,-0.287025,-1,0,0,-0.3464625,-0.45,-0.1435125],
// 5 24 -0.692925 -0.225 0.287025 -0.75 -0.225 0 -0.9239 0 0.3827 -0.375 -0.45 0
  [5,24,-0.692925,-0.225,0.287025,-0.75,-0.225,0,-0.9239,0,0.3827,-0.375,-0.45,0],
// 5 24 -0.530325 -0.225 0.530325 -0.692925 -0.225 0.287025 -0.7071 0 0.7071 -0.3464625 -0.45 0.1435125
  [5,24,-0.530325,-0.225,0.530325,-0.692925,-0.225,0.287025,-0.7071,0,0.7071,-0.3464625,-0.45,0.1435125],
// 5 24 -0.287025 -0.225 0.692925 -0.530325 -0.225 0.530325 -0.3827 0 0.9239 -0.2651625 -0.45 0.2651625
  [5,24,-0.287025,-0.225,0.692925,-0.530325,-0.225,0.530325,-0.3827,0,0.9239,-0.2651625,-0.45,0.2651625],
// 5 24 0 -0.225 0.75 -0.287025 -0.225 0.692925 0 0 1 -0.1435125 -0.45 0.3464625
  [5,24,0,-0.225,0.75,-0.287025,-0.225,0.692925,0,0,1,-0.1435125,-0.45,0.3464625],
// 5 24 0.287025 -0.225 0.692925 0 -0.225 0.75 0.3827 0 0.9239 0 -0.45 0.375
  [5,24,0.287025,-0.225,0.692925,0,-0.225,0.75,0.3827,0,0.9239,0,-0.45,0.375],
// 5 24 0.530325 -0.225 0.530325 0.287025 -0.225 0.692925 0.7071 0 0.7071 0.1435125 -0.45 0.3464625
  [5,24,0.530325,-0.225,0.530325,0.287025,-0.225,0.692925,0.7071,0,0.7071,0.1435125,-0.45,0.3464625],
// 5 24 0.692925 -0.225 0.287025 0.530325 -0.225 0.530325 0.9239 0 0.3827 0.2651625 -0.45 0.2651625
  [5,24,0.692925,-0.225,0.287025,0.530325,-0.225,0.530325,0.9239,0,0.3827,0.2651625,-0.45,0.2651625],
// 5 24 0.75 -0.225 0 0.692925 -0.225 0.287025 1 0 0 0.3464625 -0.45 0.1435125
  [5,24,0.75,-0.225,0,0.692925,-0.225,0.287025,1,0,0,0.3464625,-0.45,0.1435125],
// 5 24 0 -0.45 -0.375 -0.1435125 -0.45 -0.3464625 -0.287025 -0.225 -0.692925 0 -0.5 0
  [5,24,0,-0.45,-0.375,-0.1435125,-0.45,-0.3464625,-0.287025,-0.225,-0.692925,0,-0.5,0],
// 5 24 -0.1435125 -0.45 -0.3464625 -0.2651625 -0.45 -0.2651625 -0.530325 -0.225 -0.530325 0 -0.5 0
  [5,24,-0.1435125,-0.45,-0.3464625,-0.2651625,-0.45,-0.2651625,-0.530325,-0.225,-0.530325,0,-0.5,0],
// 5 24 -0.2651625 -0.45 -0.2651625 -0.3464625 -0.45 -0.1435125 -0.692925 -0.225 -0.287025 0 -0.5 0
  [5,24,-0.2651625,-0.45,-0.2651625,-0.3464625,-0.45,-0.1435125,-0.692925,-0.225,-0.287025,0,-0.5,0],
// 5 24 -0.3464625 -0.45 -0.1435125 -0.375 -0.45 0 -0.75 -0.225 0 0 -0.5 0
  [5,24,-0.3464625,-0.45,-0.1435125,-0.375,-0.45,0,-0.75,-0.225,0,0,-0.5,0],
// 5 24 -0.375 -0.45 0 -0.3464625 -0.45 0.1435125 -0.692925 -0.225 0.287025 0 -0.5 0
  [5,24,-0.375,-0.45,0,-0.3464625,-0.45,0.1435125,-0.692925,-0.225,0.287025,0,-0.5,0],
// 5 24 -0.3464625 -0.45 0.1435125 -0.2651625 -0.45 0.2651625 -0.530325 -0.225 0.530325 0 -0.5 0
  [5,24,-0.3464625,-0.45,0.1435125,-0.2651625,-0.45,0.2651625,-0.530325,-0.225,0.530325,0,-0.5,0],
// 5 24 -0.2651625 -0.45 0.2651625 -0.1435125 -0.45 0.3464625 -0.287025 -0.225 0.692925 0 -0.5 0
  [5,24,-0.2651625,-0.45,0.2651625,-0.1435125,-0.45,0.3464625,-0.287025,-0.225,0.692925,0,-0.5,0],
// 5 24 -0.1435125 -0.45 0.3464625 0 -0.45 0.375 0 -0.225 0.75 0 -0.5 0
  [5,24,-0.1435125,-0.45,0.3464625,0,-0.45,0.375,0,-0.225,0.75,0,-0.5,0],
// 5 24 0 -0.45 0.375 0.1435125 -0.45 0.3464625 0.287025 -0.225 0.692925 0 -0.5 0
  [5,24,0,-0.45,0.375,0.1435125,-0.45,0.3464625,0.287025,-0.225,0.692925,0,-0.5,0],
// 5 24 0.1435125 -0.45 0.3464625 0.2651625 -0.45 0.2651625 0.530325 -0.225 0.530325 0 -0.5 0
  [5,24,0.1435125,-0.45,0.3464625,0.2651625,-0.45,0.2651625,0.530325,-0.225,0.530325,0,-0.5,0],
// 5 24 0.2651625 -0.45 0.2651625 0.3464625 -0.45 0.1435125 0.692925 -0.225 0.287025 0 -0.5 0
  [5,24,0.2651625,-0.45,0.2651625,0.3464625,-0.45,0.1435125,0.692925,-0.225,0.287025,0,-0.5,0],
// 5 24 0.3464625 -0.45 0.1435125 0.375 -0.45 0 0.75 -0.225 0 0 -0.5 0
  [5,24,0.3464625,-0.45,0.1435125,0.375,-0.45,0,0.75,-0.225,0,0,-0.5,0],
// 5 24 0.375 -0.45 0 0.3464625 -0.45 -0.1435125 0.692925 -0.225 -0.287025 0 -0.5 0
  [5,24,0.375,-0.45,0,0.3464625,-0.45,-0.1435125,0.692925,-0.225,-0.287025,0,-0.5,0],
// 5 24 0.3464625 -0.45 -0.1435125 0.2651625 -0.45 -0.2651625 0.530325 -0.225 -0.530325 0 -0.5 0
  [5,24,0.3464625,-0.45,-0.1435125,0.2651625,-0.45,-0.2651625,0.530325,-0.225,-0.530325,0,-0.5,0],
// 5 24 0.2651625 -0.45 -0.2651625 0.1435125 -0.45 -0.3464625 0.287025 -0.225 -0.692925 0 -0.5 0
  [5,24,0.2651625,-0.45,-0.2651625,0.1435125,-0.45,-0.3464625,0.287025,-0.225,-0.692925,0,-0.5,0],
// 5 24 0.1435125 -0.45 -0.3464625 0 -0.45 -0.375 0 -0.225 -0.75 0 -0.5 0
  [5,24,0.1435125,-0.45,-0.3464625,0,-0.45,-0.375,0,-0.225,-0.75,0,-0.5,0],
];
module ldraw_lib__bump5000(step=0, col=false, unit=2/5, alt=false, line=0.2, solid=!$preview)
    makepoly(ldraw_lib__bump5000(solid), step=step, col=col, unit=unit, alt=alt, line=line, solid=solid);
ldraw_lib__bump5000(line=0.2);
// file: ../p/4-4ndis.scad
use <../lib.scad>
function ldraw_lib__4_4ndis() = [
// 0 Disc Negative 1.0
// 0 Name: 4-4ndis.dat
// 0 Author: James Jessiman
// 0 !LDRAW_ORG Primitive UPDATE 2012-01
// 0 !LICENSE Licensed under CC BY 2.0 and CC BY 4.0 : see CAreadme.txt
// 
// 0 BFC CERTIFY CCW
  [0,"BFC","CERTIFY"],
  [0,"BFC","CCW"],
// 
// 0 !HISTORY 2002-03-23 [sbliss] Added BFC statement; compacted code
// 0 !HISTORY 2002-04-25 [PTadmin] Official Update 2002-02
// 0 !HISTORY 2007-06-24 [PTadmin] Header formatted for Contributor Agreement
// 0 !HISTORY 2008-07-01 [PTadmin] Official Update 2008-01
// 0 !HISTORY 2012-02-16 [Philo] Changed to CCW
// 0 !HISTORY 2012-03-30 [PTadmin] Official Update 2012-01
// 
// 
// 3 16 0.9239 0 0.3827 1 0 0 1 0 1
  [3,16,0.9239,0,0.3827,1,0,0,1,0,1],
// 3 16 0.7071 0 0.7071 0.9239 0 0.3827 1 0 1
  [3,16,0.7071,0,0.7071,0.9239,0,0.3827,1,0,1],
// 3 16 0.3827 0 0.9239 0.7071 0 0.7071 1 0 1
  [3,16,0.3827,0,0.9239,0.7071,0,0.7071,1,0,1],
// 3 16 0 0 1 0.3827 0 0.9239 1 0 1
  [3,16,0,0,1,0.3827,0,0.9239,1,0,1],
// 3 16 -0.3827 0 0.9239 0 0 1 -1 0 1
  [3,16,-0.3827,0,0.9239,0,0,1,-1,0,1],
// 3 16 -0.7071 0 0.7071 -0.3827 0 0.9239 -1 0 1
  [3,16,-0.7071,0,0.7071,-0.3827,0,0.9239,-1,0,1],
// 3 16 -0.9239 0 0.3827 -0.7071 0 0.7071 -1 0 1
  [3,16,-0.9239,0,0.3827,-0.7071,0,0.7071,-1,0,1],
// 3 16 -1 0 0 -0.9239 0 0.3827 -1 0 1
  [3,16,-1,0,0,-0.9239,0,0.3827,-1,0,1],
// 3 16 -0.9239 0 -0.3827 -1 0 0 -1 0 -1
  [3,16,-0.9239,0,-0.3827,-1,0,0,-1,0,-1],
// 3 16 -0.7071 0 -0.7071 -0.9239 0 -0.3827 -1 0 -1
  [3,16,-0.7071,0,-0.7071,-0.9239,0,-0.3827,-1,0,-1],
// 3 16 -0.3827 0 -0.9239 -0.7071 0 -0.7071 -1 0 -1
  [3,16,-0.3827,0,-0.9239,-0.7071,0,-0.7071,-1,0,-1],
// 3 16 0 0 -1 -0.3827 0 -0.9239 -1 0 -1
  [3,16,0,0,-1,-0.3827,0,-0.9239,-1,0,-1],
// 3 16 0.3827 0 -0.9239 0 0 -1 1 0 -1
  [3,16,0.3827,0,-0.9239,0,0,-1,1,0,-1],
// 3 16 0.7071 0 -0.7071 0.3827 0 -0.9239 1 0 -1
  [3,16,0.7071,0,-0.7071,0.3827,0,-0.9239,1,0,-1],
// 3 16 0.9239 0 -0.3827 0.7071 0 -0.7071 1 0 -1
  [3,16,0.9239,0,-0.3827,0.7071,0,-0.7071,1,0,-1],
// 3 16 1 0 0 0.9239 0 -0.3827 1 0 -1
  [3,16,1,0,0,0.9239,0,-0.3827,1,0,-1],
];
module ldraw_lib__4_4ndis(step=0, col=false, unit=2/5, alt=false, line=0.2, solid=!$preview)
    makepoly(ldraw_lib__4_4ndis(), step=step, col=col, unit=unit, alt=alt, line=line, solid=solid);
ldraw_lib__4_4ndis(line=0.2);
// file: s/2447bs01.scad
use <../../lib.scad>
use <2447bs02.scad>
function ldraw_lib__s__2447bs01() = [
// 0 ~Minifig Helmet Visor Standard without Front Surface
// 0 Name: s\2447bs01.dat
// 0 Author: Magnus Forsberg [MagFors]
// 0 !LDRAW_ORG Subpart UPDATE 2024-07
// 0 !LICENSE Licensed under CC BY 4.0 : see CAreadme.txt
// 
// 0 BFC CERTIFY CCW
  [0,"BFC","CERTIFY"],
  [0,"BFC","CCW"],
// 
// 0 !HISTORY 2024-08-26 [OrionP] Official Update 2024-07
// 
// 1 16 0 0 0 1 0 0 0 1 0 0 0 1 s\2447bs02.dat
  [1,16,0,0,0,1,0,0,0,1,0,0,0,1, ldraw_lib__s__2447bs02()],
// 1 16 0 0 0 -1 0 0 0 1 0 0 0 1 s\2447bs02.dat
  [1,16,0,0,0,-1,0,0,0,1,0,0,0,1, ldraw_lib__s__2447bs02()],
// 5 24 0 12.245 -19.488 0 -4.875 -19.488 4.413 -4.875 -18.907 -4.413 12.034 -18.907
  [5,24,0,12.245,-19.488,0,-4.875,-19.488,4.413,-4.875,-18.907,-4.413,12.034,-18.907],
// 5 24 0 -4.875 -17 0 11.34 -17 3.769 -4.875 -16.504 -3.769 11.159 -16.504
  [5,24,0,-4.875,-17,0,11.34,-17,3.769,-4.875,-16.504,-3.769,11.159,-16.504],
];
module ldraw_lib__s__2447bs01(step=0, col=false, unit=2/5, alt=false, line=0.2, solid=!$preview)
    makepoly(ldraw_lib__s__2447bs01(), step=step, col=col, unit=unit, alt=alt, line=line, solid=solid);
ldraw_lib__s__2447bs01(line=0.2);
// file: 2447b.scad
use <../lib.scad>
use <s/2447bs01.scad>
function ldraw_lib__2447b() = [
// 0 Minifig Helmet Visor Standard
// 0 Name: 2447b.dat
// 0 Author: Magnus Forsberg [MagFors]
// 0 !LDRAW_ORG Part UPDATE 2024-07
// 0 !LICENSE Licensed under CC BY 4.0 : see CAreadme.txt
// 
// 0 !HELP alternative part numbers; 25361, 35334, 59456, 70651, 88407
// 
// 0 BFC CERTIFY CCW
  [0,"BFC","CERTIFY"],
  [0,"BFC","CCW"],
// 
// 0 !HISTORY 2013-08-14 {LEGO Digital Designer} Original part shape
// 0 !HISTORY 2024-07-15 [MagFors] File preparation for LDraw Parts Tracker
// 0 !HISTORY 2024-08-26 [OrionP] Official Update 2024-07
// 
// 1 16 0 0 0 1 0 0 0 1 0 0 0 1 s\2447bs01.dat
  [1,16,0,0,0,1,0,0,0,1,0,0,0,1, ldraw_lib__s__2447bs01()],
// 4 16 16.469 7.646 -6.85 16.469 -4.875 -6.85 14.766 -4.875 -10.962 14.766 9.142 -10.962
  [4,16,16.469,7.646,-6.85,16.469,-4.875,-6.85,14.766,-4.875,-10.962,14.766,9.142,-10.962],
// 4 16 12.056 -4.875 -14.494 12.056 10.428 -14.494 14.766 9.142 -10.962 14.766 -4.875 -10.962
  [4,16,12.056,-4.875,-14.494,12.056,10.428,-14.494,14.766,9.142,-10.962,14.766,-4.875,-10.962],
// 4 16 8.525 -4.875 -17.203 8.525 11.414 -17.203 12.056 10.428 -14.494 12.056 -4.875 -14.494
  [4,16,8.525,-4.875,-17.203,8.525,11.414,-17.203,12.056,10.428,-14.494,12.056,-4.875,-14.494],
// 4 16 4.413 -4.875 -18.907 4.413 12.034 -18.907 8.525 11.414 -17.203 8.525 -4.875 -17.203
  [4,16,4.413,-4.875,-18.907,4.413,12.034,-18.907,8.525,11.414,-17.203,8.525,-4.875,-17.203],
// 4 16 0 -4.875 -19.488 0 12.245 -19.488 4.413 12.034 -18.907 4.413 -4.875 -18.907
  [4,16,0,-4.875,-19.488,0,12.245,-19.488,4.413,12.034,-18.907,4.413,-4.875,-18.907],
// 4 16 -4.413 -4.875 -18.907 -4.413 12.034 -18.907 0 12.245 -19.488 0 -4.875 -19.488
  [4,16,-4.413,-4.875,-18.907,-4.413,12.034,-18.907,0,12.245,-19.488,0,-4.875,-19.488],
// 4 16 -4.413 12.034 -18.907 -4.413 -4.875 -18.907 -8.525 -4.875 -17.203 -8.525 11.414 -17.203
  [4,16,-4.413,12.034,-18.907,-4.413,-4.875,-18.907,-8.525,-4.875,-17.203,-8.525,11.414,-17.203],
// 4 16 -8.525 11.414 -17.203 -8.525 -4.875 -17.203 -12.056 -4.875 -14.494 -12.056 10.428 -14.494
  [4,16,-8.525,11.414,-17.203,-8.525,-4.875,-17.203,-12.056,-4.875,-14.494,-12.056,10.428,-14.494],
// 4 16 -12.056 10.428 -14.494 -12.056 -4.875 -14.494 -14.766 -4.875 -10.962 -14.766 9.142 -10.962
  [4,16,-12.056,10.428,-14.494,-12.056,-4.875,-14.494,-14.766,-4.875,-10.962,-14.766,9.142,-10.962],
// 4 16 -16.469 -4.875 -6.85 -16.469 7.646 -6.85 -14.766 9.142 -10.962 -14.766 -4.875 -10.962
  [4,16,-16.469,-4.875,-6.85,-16.469,7.646,-6.85,-14.766,9.142,-10.962,-14.766,-4.875,-10.962],
// 
];
module ldraw_lib__2447b(step=0, col=false, unit=2/5, alt=false, line=0.2, solid=!$preview)
    makepoly(ldraw_lib__2447b(), step=step, col=col, unit=unit, alt=alt, line=line, solid=solid);
ldraw_lib__2447b(line=0.2);
// main file
use <../lib.scad>
use <2447b.scad>
function ldraw_lib__35334() = [
// 0 =Minifig Helmet Visor Standard
// 0 Name: 35334.dat
// 0 Author: [PTadmin]
// 0 !LDRAW_ORG Part Alias UPDATE 2024-07
// 0 !LICENSE Licensed under CC BY 4.0 : see CAreadme.txt
// 
// 0 BFC CERTIFY CCW
  [0,"BFC","CERTIFY"],
  [0,"BFC","CCW"],
// 
// 0 !HISTORY 2024-08-26 [OrionP] Official Update 2024-07
// 
// 0 // Alias of 2447b
// 0 // Part 35334 is the transparent counterpart of 2447b
// 1 16 0 0 0 1 0 0 0 1 0 0 0 1 2447b.dat
  [1,16,0,0,0,1,0,0,0,1,0,0,0,1, ldraw_lib__2447b()],
];
module ldraw_lib__35334(step=0, col=false, unit=2/5, alt=false, line=0.2, solid=!$preview)
    makepoly(ldraw_lib__35334(), step=step, col=col, unit=unit, alt=alt, line=line, solid=solid);
ldraw_lib__35334(line=0.2);
